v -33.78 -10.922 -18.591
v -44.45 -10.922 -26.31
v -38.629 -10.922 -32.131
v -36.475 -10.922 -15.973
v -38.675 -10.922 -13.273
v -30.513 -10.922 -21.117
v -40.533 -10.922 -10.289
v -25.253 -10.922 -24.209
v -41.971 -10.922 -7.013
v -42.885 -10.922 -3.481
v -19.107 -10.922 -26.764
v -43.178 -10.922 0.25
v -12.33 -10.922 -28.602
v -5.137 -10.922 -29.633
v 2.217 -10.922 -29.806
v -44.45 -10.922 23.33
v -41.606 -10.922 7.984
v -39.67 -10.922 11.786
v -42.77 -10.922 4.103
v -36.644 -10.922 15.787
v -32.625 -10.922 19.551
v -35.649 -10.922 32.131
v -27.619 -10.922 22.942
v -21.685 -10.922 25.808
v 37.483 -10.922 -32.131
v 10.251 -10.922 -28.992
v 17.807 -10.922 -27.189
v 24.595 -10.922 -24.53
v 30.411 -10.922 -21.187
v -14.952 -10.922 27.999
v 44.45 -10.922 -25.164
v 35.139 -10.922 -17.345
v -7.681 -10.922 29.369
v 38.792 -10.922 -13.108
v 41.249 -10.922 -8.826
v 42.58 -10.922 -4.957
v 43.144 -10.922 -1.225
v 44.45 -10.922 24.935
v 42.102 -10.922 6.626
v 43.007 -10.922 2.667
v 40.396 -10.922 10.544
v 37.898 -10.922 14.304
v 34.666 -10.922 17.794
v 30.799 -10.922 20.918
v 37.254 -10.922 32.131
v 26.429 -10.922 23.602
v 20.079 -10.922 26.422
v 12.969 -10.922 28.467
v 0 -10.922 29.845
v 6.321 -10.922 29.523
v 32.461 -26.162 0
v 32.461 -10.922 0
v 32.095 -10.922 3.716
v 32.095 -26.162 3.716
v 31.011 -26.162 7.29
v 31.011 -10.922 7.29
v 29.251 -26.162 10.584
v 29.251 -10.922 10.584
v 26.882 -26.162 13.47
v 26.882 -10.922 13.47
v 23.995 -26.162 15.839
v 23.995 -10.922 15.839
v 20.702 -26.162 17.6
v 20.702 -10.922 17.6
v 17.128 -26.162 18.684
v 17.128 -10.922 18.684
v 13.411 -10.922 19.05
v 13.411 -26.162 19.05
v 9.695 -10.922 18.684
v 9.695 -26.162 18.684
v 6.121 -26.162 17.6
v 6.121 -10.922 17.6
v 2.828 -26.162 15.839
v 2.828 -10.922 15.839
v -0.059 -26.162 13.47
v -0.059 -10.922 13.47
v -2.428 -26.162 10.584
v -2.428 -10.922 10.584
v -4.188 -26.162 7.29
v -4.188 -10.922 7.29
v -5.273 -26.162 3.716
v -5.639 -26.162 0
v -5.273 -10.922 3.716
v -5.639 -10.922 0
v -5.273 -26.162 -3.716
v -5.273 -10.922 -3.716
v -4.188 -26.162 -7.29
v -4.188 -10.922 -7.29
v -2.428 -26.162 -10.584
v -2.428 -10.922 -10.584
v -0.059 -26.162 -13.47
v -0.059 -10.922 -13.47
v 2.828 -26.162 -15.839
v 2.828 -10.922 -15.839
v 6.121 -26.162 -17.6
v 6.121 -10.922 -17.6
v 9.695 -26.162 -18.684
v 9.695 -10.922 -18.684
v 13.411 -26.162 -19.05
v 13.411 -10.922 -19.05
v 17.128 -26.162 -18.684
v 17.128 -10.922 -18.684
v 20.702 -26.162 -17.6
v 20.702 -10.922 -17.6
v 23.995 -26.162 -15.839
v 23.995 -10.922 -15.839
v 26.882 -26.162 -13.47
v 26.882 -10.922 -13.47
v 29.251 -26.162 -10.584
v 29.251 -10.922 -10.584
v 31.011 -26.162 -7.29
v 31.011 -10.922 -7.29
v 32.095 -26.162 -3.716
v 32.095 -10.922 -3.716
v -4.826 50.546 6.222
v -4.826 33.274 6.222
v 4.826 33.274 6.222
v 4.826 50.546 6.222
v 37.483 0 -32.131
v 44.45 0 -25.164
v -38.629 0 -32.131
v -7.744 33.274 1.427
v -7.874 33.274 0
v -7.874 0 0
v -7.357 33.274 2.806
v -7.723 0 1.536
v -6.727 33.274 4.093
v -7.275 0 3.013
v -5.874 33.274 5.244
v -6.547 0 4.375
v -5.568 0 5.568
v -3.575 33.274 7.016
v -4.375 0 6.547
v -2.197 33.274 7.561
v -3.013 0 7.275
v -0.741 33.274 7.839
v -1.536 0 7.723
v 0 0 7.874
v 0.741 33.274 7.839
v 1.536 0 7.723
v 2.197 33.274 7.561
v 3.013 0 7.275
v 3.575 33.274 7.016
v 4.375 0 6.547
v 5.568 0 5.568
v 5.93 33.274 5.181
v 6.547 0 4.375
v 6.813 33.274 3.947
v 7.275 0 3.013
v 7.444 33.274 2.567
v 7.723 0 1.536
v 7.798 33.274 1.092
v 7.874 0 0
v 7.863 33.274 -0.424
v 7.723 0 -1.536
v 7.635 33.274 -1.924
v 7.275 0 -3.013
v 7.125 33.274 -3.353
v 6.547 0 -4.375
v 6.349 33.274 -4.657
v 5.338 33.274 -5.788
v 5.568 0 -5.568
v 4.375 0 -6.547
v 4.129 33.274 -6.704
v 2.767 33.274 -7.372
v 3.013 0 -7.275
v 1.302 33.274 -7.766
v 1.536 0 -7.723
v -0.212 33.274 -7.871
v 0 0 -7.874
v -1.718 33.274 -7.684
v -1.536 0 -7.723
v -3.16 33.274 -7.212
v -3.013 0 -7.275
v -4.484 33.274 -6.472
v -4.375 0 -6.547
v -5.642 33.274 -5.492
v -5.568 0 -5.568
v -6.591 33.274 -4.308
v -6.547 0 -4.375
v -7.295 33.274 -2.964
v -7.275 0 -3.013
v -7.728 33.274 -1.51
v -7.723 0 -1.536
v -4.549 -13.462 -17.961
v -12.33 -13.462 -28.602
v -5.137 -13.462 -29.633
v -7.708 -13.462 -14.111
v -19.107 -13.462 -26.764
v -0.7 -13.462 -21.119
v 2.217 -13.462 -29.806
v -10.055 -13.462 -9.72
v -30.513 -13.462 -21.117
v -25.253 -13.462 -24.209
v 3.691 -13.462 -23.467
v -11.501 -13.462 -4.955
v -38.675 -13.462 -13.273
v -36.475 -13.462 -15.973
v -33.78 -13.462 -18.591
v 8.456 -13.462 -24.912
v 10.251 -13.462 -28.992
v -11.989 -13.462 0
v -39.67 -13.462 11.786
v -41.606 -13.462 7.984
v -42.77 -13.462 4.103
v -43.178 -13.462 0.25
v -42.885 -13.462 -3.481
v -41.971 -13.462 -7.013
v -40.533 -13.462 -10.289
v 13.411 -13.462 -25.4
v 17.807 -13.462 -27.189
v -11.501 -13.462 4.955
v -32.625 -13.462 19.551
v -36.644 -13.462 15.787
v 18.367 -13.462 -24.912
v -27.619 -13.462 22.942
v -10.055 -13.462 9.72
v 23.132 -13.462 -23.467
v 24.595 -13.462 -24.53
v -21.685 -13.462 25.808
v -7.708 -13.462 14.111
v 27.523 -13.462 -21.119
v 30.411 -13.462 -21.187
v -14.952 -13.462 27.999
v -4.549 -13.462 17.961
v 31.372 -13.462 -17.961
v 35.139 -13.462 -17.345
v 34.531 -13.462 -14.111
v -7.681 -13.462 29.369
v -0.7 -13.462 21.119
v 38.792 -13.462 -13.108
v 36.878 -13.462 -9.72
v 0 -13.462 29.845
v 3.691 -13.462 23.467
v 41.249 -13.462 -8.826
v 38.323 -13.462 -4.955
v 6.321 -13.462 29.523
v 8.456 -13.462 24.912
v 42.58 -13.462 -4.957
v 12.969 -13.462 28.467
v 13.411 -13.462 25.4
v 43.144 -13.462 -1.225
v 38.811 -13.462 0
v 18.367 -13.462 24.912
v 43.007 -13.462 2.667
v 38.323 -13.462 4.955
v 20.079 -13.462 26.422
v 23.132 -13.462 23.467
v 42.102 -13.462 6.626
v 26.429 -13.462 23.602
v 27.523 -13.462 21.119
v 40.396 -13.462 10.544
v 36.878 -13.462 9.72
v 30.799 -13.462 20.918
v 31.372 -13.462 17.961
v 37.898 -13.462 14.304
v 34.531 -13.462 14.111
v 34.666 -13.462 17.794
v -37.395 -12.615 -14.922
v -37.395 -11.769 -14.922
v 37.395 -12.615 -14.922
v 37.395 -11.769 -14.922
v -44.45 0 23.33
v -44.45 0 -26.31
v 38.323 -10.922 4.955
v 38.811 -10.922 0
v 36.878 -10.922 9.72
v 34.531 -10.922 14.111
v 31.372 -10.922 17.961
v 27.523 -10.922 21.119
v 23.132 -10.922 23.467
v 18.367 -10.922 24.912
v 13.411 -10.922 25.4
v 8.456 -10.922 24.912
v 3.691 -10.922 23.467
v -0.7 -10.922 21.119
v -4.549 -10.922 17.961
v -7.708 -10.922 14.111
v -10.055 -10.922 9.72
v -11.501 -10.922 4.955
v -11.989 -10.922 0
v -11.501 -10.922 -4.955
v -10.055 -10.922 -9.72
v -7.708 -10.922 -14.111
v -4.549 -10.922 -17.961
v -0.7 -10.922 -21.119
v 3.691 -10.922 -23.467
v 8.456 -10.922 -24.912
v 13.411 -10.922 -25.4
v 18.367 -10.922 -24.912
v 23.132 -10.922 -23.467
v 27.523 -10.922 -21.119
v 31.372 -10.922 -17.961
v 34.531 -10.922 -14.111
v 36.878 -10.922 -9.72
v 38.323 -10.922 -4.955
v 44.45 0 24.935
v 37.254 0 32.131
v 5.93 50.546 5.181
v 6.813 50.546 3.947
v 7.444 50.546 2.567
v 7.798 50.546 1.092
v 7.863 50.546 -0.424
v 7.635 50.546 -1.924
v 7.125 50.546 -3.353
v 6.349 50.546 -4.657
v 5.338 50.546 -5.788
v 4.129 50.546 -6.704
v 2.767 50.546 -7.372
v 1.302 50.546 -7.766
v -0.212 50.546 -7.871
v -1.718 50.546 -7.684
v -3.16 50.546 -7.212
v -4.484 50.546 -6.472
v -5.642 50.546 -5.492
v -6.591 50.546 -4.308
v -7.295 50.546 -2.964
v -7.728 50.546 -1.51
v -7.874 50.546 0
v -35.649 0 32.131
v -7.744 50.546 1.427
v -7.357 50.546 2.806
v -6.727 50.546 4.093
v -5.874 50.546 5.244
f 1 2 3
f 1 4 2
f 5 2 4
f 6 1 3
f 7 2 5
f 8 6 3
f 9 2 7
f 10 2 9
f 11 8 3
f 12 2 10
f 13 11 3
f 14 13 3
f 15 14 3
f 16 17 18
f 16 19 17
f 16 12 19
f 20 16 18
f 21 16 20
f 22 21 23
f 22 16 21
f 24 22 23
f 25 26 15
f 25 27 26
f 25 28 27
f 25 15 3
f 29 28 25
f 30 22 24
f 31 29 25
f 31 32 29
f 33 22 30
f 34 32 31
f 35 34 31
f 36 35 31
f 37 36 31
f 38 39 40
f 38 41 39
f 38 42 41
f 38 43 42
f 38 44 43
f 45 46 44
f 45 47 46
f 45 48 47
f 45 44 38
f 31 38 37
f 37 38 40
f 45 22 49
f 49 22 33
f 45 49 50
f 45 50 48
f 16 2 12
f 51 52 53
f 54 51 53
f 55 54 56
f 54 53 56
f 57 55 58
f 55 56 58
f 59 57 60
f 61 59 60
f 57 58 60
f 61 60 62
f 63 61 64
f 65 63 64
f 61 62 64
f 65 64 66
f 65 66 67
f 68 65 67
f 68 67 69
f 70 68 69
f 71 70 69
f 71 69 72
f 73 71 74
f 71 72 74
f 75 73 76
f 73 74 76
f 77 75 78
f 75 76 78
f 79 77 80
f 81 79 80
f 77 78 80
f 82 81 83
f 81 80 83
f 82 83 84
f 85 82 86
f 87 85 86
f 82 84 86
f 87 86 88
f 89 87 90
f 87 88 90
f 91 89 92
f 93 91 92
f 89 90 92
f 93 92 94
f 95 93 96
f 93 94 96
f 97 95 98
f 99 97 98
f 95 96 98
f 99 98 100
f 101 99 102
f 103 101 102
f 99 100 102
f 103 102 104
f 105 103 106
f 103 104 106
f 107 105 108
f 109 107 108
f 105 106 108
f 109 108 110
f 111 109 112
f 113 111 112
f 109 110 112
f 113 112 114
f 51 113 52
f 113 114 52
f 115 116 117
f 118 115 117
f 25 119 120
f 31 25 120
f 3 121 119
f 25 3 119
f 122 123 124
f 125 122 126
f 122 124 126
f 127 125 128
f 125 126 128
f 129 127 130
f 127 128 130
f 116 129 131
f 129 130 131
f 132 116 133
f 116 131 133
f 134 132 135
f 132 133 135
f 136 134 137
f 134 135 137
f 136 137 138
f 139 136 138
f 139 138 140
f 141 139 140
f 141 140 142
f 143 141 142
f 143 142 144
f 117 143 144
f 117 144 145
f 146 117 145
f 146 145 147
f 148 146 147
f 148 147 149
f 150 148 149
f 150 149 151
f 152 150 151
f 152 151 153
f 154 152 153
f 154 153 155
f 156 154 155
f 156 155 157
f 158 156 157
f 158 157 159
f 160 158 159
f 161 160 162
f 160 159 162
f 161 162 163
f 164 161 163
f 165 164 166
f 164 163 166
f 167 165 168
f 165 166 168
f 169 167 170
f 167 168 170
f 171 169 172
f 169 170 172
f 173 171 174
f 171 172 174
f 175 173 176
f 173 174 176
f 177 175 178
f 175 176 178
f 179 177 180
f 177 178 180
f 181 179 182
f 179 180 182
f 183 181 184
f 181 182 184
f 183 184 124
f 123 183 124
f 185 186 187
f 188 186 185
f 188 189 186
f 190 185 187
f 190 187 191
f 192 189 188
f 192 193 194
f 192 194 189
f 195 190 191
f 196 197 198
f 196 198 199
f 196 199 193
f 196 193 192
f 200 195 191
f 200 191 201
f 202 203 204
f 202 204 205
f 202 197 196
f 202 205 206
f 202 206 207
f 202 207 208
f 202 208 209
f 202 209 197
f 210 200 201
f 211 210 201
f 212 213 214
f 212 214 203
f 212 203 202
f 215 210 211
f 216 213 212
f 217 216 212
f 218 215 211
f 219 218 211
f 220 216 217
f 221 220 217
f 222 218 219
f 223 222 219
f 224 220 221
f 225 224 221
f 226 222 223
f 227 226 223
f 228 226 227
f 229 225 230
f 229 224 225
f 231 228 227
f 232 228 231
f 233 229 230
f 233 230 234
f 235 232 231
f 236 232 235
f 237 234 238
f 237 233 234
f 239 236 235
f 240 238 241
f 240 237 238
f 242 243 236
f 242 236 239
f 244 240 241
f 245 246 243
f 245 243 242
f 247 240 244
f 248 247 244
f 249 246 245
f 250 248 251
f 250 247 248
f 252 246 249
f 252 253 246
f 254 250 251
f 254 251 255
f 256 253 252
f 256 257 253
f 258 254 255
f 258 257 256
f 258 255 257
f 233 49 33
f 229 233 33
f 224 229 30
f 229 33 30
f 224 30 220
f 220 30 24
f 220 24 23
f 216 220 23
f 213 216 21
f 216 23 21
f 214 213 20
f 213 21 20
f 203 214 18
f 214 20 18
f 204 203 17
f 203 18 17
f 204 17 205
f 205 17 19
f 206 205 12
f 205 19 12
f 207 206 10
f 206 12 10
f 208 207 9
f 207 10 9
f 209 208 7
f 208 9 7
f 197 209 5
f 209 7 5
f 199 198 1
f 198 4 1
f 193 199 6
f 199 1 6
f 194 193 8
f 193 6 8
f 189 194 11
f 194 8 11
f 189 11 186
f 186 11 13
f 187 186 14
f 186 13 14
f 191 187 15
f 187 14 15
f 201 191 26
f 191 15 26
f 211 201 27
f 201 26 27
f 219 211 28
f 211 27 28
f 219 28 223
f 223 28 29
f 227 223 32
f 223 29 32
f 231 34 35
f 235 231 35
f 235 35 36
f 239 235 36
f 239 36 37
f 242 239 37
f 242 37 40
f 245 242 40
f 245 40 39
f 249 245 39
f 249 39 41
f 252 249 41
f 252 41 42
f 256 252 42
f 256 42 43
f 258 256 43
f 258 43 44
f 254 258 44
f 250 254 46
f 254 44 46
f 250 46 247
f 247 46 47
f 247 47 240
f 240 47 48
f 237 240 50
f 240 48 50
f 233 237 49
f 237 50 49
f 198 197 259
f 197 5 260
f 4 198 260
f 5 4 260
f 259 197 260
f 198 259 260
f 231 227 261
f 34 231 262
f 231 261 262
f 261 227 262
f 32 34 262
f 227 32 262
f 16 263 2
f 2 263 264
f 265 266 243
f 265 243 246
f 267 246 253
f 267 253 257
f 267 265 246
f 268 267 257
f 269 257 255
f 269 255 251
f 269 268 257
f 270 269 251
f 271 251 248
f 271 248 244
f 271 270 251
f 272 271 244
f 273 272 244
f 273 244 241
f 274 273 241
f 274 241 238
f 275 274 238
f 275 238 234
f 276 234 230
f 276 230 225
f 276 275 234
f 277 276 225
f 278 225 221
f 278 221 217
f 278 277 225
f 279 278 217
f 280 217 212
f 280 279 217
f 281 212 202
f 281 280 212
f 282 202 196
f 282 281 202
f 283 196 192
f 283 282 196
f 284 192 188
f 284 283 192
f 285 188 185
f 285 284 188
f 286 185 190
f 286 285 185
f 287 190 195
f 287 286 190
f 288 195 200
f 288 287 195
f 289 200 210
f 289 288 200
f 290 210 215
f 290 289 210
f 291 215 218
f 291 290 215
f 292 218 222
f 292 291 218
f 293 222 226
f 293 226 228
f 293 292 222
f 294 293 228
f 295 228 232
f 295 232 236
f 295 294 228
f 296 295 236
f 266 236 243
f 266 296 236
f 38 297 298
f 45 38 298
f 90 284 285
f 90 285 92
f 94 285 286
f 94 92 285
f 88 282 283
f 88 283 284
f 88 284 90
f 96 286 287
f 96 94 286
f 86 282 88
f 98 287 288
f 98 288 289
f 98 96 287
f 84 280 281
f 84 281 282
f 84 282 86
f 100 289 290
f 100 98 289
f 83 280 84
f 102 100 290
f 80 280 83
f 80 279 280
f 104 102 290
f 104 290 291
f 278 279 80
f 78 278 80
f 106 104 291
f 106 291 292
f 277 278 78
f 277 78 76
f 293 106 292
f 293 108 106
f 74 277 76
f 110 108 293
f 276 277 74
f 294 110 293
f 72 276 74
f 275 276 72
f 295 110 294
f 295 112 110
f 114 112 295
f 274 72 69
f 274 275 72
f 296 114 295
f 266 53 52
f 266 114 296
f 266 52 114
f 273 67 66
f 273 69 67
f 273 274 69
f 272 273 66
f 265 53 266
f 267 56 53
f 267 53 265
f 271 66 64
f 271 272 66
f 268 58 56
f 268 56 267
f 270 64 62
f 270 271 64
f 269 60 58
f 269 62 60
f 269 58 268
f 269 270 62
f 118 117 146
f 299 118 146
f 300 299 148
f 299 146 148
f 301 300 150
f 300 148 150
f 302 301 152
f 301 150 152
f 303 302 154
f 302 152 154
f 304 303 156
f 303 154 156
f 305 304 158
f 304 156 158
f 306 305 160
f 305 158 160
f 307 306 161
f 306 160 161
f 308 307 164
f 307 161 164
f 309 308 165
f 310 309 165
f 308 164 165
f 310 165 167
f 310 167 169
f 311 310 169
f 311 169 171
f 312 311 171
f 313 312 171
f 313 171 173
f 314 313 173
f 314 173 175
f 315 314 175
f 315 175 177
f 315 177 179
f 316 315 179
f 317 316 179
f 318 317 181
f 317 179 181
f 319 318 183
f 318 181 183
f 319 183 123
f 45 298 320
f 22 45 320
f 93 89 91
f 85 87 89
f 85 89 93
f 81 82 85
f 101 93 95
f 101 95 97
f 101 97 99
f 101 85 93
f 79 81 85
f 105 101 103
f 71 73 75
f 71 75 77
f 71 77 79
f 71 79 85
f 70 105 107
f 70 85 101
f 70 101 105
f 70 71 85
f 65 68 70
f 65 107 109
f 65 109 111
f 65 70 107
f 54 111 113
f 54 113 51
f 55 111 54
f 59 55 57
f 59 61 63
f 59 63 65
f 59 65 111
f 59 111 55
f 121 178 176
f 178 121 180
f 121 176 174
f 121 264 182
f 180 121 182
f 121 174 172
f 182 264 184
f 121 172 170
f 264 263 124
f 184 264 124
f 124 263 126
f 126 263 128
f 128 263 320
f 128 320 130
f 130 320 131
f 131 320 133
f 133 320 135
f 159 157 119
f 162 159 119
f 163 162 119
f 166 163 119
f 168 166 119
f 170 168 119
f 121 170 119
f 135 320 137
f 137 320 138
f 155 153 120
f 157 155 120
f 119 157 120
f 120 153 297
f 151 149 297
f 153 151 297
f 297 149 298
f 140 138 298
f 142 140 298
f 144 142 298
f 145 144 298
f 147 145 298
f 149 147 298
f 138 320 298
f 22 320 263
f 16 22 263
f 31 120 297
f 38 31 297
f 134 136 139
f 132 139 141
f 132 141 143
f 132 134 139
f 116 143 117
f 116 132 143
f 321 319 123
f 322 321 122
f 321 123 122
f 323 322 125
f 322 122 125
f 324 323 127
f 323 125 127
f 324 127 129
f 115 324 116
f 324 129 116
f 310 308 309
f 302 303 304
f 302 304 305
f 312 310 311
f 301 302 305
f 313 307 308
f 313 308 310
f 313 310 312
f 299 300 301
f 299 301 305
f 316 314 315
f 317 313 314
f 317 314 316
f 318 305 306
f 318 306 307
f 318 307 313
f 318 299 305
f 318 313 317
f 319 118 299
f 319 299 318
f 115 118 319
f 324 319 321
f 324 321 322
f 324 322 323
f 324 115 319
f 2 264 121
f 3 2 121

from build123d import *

# Parameters (mm, degrees)
F1_DEPTH = 10.922
F2_R     = 25.4
F3_DEPTH = 2.54
F4_R     = 19.05
F5_DEPTH = 15.24
F6_R     = 7.874
F7_DEPTH = 33.274
F9_DEPTH = 17.272


with BuildPart() as f1:
    # F0 (on Front) → F1 (new body)
    with BuildSketch(Plane.XZ):
        Polygon((-44.45, -26.310472), (-38.629472, -32.131), (37.483197, -32.131), (44.45, -25.164197), (44.45, 24.934939), (37.253939, 32.131), (-35.649154, 32.131), (-44.45, 23.330154), align=None)
    extrude(amount=F1_DEPTH)

    # F2 (on face) → F3 (join)
    with BuildSketch(Plane.XZ.offset(10.922)):
        with BuildLine():
            add(Edge.make_bspline(
                [(0, 29.845), (-74.789954, 29.845), (-37.394977, -14.9225), (0, -59.69), (37.394977, -14.9225), (74.789954, 29.845), (0, 29.845)],
                knots=[4.712389, 4.712389, 4.712389, 6.806784, 6.806784, 8.901179, 8.901179, 10.995574, 10.995574, 10.995574], degree=2, weights=[1, 0.5, 1, 0.5, 1, 0.5, 1]))
        make_face()
        with Locations((13.411419, 0)):
            Circle(F2_R, mode=Mode.SUBTRACT)
    extrude(amount=F3_DEPTH)

    # F4 (on face) → F5 (join)
    with BuildSketch(Plane.XZ.offset(10.922)):
        with Locations((13.411419, 0)):
            Circle(F4_R)
    extrude(amount=F5_DEPTH)

    # F6 (on face) → F7 (join)
    with BuildSketch(Plane(origin=(0, 0, 0), x_dir=(-1, 0, 0), z_dir=(0, 1, 0))):
        Circle(F6_R)
    extrude(amount=F7_DEPTH)

    # F8 (on face) → F9 (join)
    with BuildSketch(Plane(origin=(0, 33.274, 0), x_dir=(-1, 0, 0), z_dir=(0, 1, 0))):
        with BuildLine():
            Line((4.826, 6.221704), (-4.826, 6.221704))
            ThreePointArc((-4.826, 6.221704), (-3.464098, -7.071061), (7.874, 0))
            ThreePointArc((7.874, 0), (7.071061, 3.464098), (4.826, 6.221704))
        make_face()
    extrude(amount=F9_DEPTH)


solid = f1.part
